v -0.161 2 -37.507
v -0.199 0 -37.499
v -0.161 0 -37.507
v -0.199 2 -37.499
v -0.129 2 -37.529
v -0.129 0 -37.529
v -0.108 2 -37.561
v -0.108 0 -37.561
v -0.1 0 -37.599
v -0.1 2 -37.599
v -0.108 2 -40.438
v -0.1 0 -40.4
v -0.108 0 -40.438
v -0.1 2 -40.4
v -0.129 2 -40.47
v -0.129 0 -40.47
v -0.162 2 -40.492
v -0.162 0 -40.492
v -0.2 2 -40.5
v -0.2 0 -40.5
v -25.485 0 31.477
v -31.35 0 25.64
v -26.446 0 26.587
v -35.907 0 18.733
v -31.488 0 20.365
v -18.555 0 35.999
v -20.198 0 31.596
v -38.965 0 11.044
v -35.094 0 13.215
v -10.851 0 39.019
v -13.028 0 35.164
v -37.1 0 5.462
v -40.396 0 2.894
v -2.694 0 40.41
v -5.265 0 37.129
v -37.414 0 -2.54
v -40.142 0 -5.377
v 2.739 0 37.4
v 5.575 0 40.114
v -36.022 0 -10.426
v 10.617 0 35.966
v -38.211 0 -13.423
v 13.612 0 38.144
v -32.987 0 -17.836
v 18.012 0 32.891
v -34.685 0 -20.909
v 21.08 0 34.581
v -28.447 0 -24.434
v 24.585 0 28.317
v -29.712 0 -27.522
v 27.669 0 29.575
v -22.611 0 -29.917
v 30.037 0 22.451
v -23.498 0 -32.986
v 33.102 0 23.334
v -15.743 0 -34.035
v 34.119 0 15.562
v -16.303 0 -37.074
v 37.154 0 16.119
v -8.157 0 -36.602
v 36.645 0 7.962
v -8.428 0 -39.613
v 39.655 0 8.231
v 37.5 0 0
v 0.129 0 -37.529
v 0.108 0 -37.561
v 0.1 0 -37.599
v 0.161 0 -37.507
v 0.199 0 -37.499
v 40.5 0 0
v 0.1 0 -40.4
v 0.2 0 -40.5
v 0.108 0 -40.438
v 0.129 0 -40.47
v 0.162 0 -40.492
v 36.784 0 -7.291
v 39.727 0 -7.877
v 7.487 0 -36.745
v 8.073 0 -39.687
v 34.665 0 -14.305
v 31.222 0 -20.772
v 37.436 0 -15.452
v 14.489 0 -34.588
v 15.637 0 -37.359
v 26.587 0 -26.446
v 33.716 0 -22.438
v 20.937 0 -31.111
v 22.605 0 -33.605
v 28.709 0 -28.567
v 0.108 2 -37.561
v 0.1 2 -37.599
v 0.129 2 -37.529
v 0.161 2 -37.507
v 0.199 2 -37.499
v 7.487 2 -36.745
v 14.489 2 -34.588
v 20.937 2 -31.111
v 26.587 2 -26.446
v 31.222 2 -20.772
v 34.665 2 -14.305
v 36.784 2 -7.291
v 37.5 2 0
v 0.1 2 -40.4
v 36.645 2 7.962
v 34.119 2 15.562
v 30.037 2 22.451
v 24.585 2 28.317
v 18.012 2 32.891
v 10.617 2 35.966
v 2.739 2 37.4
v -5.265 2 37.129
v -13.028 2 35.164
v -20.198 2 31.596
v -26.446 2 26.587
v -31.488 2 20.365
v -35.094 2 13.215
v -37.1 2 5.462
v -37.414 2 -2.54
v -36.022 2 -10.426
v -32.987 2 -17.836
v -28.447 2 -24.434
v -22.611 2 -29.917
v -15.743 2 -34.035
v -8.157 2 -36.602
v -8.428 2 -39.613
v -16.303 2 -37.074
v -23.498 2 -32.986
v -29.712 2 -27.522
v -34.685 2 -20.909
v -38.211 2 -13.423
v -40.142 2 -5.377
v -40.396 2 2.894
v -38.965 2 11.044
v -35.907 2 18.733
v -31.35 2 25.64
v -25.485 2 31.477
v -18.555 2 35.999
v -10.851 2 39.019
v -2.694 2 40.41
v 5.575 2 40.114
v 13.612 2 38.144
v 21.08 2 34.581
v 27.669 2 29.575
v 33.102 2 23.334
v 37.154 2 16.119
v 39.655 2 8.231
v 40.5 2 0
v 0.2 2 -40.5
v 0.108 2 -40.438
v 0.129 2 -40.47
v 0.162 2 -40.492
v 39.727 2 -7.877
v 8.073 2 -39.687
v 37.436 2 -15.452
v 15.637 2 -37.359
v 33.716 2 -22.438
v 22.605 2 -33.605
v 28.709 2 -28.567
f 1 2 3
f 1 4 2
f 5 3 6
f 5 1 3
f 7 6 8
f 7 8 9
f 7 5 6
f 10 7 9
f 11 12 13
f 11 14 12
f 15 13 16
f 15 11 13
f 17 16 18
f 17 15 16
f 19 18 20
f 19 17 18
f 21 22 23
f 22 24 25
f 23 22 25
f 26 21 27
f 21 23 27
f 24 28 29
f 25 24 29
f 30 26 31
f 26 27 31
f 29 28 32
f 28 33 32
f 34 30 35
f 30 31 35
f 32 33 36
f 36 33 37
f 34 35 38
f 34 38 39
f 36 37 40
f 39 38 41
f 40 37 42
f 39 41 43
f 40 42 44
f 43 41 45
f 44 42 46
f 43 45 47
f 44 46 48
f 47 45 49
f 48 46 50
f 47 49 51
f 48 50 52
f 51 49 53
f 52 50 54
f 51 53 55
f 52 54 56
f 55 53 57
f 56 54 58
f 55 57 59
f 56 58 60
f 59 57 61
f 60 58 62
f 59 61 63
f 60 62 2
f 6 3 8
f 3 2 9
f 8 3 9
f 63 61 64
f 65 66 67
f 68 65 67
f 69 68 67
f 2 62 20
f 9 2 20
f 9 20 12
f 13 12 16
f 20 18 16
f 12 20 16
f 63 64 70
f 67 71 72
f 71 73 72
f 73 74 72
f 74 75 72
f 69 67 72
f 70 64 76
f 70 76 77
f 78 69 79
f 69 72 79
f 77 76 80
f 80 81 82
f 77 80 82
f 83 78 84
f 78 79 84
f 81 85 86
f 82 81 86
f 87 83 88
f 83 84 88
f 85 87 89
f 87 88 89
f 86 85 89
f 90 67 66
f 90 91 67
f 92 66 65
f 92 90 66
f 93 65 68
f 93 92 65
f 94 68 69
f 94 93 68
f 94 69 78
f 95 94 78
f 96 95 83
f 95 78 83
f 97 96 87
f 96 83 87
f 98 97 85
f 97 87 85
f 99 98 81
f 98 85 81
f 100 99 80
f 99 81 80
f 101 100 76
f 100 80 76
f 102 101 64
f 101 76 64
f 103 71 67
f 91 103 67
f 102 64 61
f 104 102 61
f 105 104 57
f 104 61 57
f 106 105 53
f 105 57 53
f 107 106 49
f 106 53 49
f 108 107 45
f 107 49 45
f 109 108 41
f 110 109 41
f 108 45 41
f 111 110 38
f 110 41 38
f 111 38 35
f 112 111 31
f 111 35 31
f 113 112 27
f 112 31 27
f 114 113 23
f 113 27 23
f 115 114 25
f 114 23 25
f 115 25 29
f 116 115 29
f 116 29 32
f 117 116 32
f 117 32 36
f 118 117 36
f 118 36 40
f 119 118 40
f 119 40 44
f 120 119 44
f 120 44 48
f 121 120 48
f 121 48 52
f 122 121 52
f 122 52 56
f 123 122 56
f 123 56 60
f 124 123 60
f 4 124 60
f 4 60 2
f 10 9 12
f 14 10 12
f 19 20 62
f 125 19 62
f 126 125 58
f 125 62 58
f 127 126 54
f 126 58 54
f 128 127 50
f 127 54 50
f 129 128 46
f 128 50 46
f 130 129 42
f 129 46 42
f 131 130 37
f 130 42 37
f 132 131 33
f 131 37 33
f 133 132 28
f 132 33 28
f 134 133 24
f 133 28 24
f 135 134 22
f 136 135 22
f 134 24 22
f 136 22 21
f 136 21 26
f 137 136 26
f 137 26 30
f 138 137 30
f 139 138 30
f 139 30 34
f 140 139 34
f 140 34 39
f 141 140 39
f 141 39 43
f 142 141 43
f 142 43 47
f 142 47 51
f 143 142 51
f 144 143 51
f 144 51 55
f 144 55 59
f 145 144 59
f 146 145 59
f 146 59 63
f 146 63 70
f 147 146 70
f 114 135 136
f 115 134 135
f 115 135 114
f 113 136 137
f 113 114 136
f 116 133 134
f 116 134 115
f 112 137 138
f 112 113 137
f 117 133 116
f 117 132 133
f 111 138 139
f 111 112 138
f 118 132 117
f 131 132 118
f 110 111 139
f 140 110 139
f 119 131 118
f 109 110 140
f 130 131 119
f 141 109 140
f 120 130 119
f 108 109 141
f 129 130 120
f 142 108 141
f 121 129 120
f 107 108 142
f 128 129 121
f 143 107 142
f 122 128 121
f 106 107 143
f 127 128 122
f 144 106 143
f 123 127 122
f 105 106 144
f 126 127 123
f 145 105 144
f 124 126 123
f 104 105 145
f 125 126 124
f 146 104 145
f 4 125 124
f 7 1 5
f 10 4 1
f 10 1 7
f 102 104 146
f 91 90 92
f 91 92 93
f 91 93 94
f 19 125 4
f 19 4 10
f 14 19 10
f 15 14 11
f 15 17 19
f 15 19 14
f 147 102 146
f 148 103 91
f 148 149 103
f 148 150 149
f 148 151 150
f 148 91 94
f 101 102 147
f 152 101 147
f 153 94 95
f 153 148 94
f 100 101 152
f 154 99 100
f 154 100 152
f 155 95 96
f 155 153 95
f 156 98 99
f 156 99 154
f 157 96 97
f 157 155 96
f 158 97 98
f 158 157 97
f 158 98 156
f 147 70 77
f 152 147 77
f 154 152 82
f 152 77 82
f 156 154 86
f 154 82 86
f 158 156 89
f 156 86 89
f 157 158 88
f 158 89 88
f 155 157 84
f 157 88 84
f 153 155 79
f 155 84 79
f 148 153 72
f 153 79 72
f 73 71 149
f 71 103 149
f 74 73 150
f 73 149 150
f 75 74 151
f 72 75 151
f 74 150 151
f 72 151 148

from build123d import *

# Parameters (mm, degrees)
BOSS_EXTRUDE1_DEPTH = 2
FILLET1_R           = 0.1


with BuildPart() as part:
    # Sketch1 → Boss-Extrude1 (new body)
    with BuildSketch(Plane(origin=(0, 0, 0), x_dir=(1, 0, 0), z_dir=(0, 1, 0))):
        with BuildLine():
            Line((0.1, 40.499876543), (0.1, 37.499866666))
            ThreePointArc((0.1, 37.499866666), (26.551836095, 26.481125354), (37.5, 0))
            ThreePointArc((37.5, 0), (-26.481125354, -26.551836095), (-0.1, 37.499866666))
            Line((-0.1, 37.499866666), (-0.1, 40.499876543))
            ThreePointArc((-0.1, 40.499876543), (-28.602447448, -28.67315818), (40.5, 0))
            ThreePointArc((40.5, 0), (28.67315818, 28.602447448), (0.1, 40.499876543))
        make_face()
    extrude(amount=BOSS_EXTRUDE1_DEPTH)

    # Fillet1
    fillet1_edges = [part.edges().sort_by_distance(p)[0] for p in [
        (-0.1, 1, -37.499866666),
        (0.1, 1, -37.499866666),
        (0.1, 1, -40.499876543),
        (-0.1, 1, -40.499876543),
    ]]
    fillet(fillet1_edges, radius=FILLET1_R)


solid = part.part
